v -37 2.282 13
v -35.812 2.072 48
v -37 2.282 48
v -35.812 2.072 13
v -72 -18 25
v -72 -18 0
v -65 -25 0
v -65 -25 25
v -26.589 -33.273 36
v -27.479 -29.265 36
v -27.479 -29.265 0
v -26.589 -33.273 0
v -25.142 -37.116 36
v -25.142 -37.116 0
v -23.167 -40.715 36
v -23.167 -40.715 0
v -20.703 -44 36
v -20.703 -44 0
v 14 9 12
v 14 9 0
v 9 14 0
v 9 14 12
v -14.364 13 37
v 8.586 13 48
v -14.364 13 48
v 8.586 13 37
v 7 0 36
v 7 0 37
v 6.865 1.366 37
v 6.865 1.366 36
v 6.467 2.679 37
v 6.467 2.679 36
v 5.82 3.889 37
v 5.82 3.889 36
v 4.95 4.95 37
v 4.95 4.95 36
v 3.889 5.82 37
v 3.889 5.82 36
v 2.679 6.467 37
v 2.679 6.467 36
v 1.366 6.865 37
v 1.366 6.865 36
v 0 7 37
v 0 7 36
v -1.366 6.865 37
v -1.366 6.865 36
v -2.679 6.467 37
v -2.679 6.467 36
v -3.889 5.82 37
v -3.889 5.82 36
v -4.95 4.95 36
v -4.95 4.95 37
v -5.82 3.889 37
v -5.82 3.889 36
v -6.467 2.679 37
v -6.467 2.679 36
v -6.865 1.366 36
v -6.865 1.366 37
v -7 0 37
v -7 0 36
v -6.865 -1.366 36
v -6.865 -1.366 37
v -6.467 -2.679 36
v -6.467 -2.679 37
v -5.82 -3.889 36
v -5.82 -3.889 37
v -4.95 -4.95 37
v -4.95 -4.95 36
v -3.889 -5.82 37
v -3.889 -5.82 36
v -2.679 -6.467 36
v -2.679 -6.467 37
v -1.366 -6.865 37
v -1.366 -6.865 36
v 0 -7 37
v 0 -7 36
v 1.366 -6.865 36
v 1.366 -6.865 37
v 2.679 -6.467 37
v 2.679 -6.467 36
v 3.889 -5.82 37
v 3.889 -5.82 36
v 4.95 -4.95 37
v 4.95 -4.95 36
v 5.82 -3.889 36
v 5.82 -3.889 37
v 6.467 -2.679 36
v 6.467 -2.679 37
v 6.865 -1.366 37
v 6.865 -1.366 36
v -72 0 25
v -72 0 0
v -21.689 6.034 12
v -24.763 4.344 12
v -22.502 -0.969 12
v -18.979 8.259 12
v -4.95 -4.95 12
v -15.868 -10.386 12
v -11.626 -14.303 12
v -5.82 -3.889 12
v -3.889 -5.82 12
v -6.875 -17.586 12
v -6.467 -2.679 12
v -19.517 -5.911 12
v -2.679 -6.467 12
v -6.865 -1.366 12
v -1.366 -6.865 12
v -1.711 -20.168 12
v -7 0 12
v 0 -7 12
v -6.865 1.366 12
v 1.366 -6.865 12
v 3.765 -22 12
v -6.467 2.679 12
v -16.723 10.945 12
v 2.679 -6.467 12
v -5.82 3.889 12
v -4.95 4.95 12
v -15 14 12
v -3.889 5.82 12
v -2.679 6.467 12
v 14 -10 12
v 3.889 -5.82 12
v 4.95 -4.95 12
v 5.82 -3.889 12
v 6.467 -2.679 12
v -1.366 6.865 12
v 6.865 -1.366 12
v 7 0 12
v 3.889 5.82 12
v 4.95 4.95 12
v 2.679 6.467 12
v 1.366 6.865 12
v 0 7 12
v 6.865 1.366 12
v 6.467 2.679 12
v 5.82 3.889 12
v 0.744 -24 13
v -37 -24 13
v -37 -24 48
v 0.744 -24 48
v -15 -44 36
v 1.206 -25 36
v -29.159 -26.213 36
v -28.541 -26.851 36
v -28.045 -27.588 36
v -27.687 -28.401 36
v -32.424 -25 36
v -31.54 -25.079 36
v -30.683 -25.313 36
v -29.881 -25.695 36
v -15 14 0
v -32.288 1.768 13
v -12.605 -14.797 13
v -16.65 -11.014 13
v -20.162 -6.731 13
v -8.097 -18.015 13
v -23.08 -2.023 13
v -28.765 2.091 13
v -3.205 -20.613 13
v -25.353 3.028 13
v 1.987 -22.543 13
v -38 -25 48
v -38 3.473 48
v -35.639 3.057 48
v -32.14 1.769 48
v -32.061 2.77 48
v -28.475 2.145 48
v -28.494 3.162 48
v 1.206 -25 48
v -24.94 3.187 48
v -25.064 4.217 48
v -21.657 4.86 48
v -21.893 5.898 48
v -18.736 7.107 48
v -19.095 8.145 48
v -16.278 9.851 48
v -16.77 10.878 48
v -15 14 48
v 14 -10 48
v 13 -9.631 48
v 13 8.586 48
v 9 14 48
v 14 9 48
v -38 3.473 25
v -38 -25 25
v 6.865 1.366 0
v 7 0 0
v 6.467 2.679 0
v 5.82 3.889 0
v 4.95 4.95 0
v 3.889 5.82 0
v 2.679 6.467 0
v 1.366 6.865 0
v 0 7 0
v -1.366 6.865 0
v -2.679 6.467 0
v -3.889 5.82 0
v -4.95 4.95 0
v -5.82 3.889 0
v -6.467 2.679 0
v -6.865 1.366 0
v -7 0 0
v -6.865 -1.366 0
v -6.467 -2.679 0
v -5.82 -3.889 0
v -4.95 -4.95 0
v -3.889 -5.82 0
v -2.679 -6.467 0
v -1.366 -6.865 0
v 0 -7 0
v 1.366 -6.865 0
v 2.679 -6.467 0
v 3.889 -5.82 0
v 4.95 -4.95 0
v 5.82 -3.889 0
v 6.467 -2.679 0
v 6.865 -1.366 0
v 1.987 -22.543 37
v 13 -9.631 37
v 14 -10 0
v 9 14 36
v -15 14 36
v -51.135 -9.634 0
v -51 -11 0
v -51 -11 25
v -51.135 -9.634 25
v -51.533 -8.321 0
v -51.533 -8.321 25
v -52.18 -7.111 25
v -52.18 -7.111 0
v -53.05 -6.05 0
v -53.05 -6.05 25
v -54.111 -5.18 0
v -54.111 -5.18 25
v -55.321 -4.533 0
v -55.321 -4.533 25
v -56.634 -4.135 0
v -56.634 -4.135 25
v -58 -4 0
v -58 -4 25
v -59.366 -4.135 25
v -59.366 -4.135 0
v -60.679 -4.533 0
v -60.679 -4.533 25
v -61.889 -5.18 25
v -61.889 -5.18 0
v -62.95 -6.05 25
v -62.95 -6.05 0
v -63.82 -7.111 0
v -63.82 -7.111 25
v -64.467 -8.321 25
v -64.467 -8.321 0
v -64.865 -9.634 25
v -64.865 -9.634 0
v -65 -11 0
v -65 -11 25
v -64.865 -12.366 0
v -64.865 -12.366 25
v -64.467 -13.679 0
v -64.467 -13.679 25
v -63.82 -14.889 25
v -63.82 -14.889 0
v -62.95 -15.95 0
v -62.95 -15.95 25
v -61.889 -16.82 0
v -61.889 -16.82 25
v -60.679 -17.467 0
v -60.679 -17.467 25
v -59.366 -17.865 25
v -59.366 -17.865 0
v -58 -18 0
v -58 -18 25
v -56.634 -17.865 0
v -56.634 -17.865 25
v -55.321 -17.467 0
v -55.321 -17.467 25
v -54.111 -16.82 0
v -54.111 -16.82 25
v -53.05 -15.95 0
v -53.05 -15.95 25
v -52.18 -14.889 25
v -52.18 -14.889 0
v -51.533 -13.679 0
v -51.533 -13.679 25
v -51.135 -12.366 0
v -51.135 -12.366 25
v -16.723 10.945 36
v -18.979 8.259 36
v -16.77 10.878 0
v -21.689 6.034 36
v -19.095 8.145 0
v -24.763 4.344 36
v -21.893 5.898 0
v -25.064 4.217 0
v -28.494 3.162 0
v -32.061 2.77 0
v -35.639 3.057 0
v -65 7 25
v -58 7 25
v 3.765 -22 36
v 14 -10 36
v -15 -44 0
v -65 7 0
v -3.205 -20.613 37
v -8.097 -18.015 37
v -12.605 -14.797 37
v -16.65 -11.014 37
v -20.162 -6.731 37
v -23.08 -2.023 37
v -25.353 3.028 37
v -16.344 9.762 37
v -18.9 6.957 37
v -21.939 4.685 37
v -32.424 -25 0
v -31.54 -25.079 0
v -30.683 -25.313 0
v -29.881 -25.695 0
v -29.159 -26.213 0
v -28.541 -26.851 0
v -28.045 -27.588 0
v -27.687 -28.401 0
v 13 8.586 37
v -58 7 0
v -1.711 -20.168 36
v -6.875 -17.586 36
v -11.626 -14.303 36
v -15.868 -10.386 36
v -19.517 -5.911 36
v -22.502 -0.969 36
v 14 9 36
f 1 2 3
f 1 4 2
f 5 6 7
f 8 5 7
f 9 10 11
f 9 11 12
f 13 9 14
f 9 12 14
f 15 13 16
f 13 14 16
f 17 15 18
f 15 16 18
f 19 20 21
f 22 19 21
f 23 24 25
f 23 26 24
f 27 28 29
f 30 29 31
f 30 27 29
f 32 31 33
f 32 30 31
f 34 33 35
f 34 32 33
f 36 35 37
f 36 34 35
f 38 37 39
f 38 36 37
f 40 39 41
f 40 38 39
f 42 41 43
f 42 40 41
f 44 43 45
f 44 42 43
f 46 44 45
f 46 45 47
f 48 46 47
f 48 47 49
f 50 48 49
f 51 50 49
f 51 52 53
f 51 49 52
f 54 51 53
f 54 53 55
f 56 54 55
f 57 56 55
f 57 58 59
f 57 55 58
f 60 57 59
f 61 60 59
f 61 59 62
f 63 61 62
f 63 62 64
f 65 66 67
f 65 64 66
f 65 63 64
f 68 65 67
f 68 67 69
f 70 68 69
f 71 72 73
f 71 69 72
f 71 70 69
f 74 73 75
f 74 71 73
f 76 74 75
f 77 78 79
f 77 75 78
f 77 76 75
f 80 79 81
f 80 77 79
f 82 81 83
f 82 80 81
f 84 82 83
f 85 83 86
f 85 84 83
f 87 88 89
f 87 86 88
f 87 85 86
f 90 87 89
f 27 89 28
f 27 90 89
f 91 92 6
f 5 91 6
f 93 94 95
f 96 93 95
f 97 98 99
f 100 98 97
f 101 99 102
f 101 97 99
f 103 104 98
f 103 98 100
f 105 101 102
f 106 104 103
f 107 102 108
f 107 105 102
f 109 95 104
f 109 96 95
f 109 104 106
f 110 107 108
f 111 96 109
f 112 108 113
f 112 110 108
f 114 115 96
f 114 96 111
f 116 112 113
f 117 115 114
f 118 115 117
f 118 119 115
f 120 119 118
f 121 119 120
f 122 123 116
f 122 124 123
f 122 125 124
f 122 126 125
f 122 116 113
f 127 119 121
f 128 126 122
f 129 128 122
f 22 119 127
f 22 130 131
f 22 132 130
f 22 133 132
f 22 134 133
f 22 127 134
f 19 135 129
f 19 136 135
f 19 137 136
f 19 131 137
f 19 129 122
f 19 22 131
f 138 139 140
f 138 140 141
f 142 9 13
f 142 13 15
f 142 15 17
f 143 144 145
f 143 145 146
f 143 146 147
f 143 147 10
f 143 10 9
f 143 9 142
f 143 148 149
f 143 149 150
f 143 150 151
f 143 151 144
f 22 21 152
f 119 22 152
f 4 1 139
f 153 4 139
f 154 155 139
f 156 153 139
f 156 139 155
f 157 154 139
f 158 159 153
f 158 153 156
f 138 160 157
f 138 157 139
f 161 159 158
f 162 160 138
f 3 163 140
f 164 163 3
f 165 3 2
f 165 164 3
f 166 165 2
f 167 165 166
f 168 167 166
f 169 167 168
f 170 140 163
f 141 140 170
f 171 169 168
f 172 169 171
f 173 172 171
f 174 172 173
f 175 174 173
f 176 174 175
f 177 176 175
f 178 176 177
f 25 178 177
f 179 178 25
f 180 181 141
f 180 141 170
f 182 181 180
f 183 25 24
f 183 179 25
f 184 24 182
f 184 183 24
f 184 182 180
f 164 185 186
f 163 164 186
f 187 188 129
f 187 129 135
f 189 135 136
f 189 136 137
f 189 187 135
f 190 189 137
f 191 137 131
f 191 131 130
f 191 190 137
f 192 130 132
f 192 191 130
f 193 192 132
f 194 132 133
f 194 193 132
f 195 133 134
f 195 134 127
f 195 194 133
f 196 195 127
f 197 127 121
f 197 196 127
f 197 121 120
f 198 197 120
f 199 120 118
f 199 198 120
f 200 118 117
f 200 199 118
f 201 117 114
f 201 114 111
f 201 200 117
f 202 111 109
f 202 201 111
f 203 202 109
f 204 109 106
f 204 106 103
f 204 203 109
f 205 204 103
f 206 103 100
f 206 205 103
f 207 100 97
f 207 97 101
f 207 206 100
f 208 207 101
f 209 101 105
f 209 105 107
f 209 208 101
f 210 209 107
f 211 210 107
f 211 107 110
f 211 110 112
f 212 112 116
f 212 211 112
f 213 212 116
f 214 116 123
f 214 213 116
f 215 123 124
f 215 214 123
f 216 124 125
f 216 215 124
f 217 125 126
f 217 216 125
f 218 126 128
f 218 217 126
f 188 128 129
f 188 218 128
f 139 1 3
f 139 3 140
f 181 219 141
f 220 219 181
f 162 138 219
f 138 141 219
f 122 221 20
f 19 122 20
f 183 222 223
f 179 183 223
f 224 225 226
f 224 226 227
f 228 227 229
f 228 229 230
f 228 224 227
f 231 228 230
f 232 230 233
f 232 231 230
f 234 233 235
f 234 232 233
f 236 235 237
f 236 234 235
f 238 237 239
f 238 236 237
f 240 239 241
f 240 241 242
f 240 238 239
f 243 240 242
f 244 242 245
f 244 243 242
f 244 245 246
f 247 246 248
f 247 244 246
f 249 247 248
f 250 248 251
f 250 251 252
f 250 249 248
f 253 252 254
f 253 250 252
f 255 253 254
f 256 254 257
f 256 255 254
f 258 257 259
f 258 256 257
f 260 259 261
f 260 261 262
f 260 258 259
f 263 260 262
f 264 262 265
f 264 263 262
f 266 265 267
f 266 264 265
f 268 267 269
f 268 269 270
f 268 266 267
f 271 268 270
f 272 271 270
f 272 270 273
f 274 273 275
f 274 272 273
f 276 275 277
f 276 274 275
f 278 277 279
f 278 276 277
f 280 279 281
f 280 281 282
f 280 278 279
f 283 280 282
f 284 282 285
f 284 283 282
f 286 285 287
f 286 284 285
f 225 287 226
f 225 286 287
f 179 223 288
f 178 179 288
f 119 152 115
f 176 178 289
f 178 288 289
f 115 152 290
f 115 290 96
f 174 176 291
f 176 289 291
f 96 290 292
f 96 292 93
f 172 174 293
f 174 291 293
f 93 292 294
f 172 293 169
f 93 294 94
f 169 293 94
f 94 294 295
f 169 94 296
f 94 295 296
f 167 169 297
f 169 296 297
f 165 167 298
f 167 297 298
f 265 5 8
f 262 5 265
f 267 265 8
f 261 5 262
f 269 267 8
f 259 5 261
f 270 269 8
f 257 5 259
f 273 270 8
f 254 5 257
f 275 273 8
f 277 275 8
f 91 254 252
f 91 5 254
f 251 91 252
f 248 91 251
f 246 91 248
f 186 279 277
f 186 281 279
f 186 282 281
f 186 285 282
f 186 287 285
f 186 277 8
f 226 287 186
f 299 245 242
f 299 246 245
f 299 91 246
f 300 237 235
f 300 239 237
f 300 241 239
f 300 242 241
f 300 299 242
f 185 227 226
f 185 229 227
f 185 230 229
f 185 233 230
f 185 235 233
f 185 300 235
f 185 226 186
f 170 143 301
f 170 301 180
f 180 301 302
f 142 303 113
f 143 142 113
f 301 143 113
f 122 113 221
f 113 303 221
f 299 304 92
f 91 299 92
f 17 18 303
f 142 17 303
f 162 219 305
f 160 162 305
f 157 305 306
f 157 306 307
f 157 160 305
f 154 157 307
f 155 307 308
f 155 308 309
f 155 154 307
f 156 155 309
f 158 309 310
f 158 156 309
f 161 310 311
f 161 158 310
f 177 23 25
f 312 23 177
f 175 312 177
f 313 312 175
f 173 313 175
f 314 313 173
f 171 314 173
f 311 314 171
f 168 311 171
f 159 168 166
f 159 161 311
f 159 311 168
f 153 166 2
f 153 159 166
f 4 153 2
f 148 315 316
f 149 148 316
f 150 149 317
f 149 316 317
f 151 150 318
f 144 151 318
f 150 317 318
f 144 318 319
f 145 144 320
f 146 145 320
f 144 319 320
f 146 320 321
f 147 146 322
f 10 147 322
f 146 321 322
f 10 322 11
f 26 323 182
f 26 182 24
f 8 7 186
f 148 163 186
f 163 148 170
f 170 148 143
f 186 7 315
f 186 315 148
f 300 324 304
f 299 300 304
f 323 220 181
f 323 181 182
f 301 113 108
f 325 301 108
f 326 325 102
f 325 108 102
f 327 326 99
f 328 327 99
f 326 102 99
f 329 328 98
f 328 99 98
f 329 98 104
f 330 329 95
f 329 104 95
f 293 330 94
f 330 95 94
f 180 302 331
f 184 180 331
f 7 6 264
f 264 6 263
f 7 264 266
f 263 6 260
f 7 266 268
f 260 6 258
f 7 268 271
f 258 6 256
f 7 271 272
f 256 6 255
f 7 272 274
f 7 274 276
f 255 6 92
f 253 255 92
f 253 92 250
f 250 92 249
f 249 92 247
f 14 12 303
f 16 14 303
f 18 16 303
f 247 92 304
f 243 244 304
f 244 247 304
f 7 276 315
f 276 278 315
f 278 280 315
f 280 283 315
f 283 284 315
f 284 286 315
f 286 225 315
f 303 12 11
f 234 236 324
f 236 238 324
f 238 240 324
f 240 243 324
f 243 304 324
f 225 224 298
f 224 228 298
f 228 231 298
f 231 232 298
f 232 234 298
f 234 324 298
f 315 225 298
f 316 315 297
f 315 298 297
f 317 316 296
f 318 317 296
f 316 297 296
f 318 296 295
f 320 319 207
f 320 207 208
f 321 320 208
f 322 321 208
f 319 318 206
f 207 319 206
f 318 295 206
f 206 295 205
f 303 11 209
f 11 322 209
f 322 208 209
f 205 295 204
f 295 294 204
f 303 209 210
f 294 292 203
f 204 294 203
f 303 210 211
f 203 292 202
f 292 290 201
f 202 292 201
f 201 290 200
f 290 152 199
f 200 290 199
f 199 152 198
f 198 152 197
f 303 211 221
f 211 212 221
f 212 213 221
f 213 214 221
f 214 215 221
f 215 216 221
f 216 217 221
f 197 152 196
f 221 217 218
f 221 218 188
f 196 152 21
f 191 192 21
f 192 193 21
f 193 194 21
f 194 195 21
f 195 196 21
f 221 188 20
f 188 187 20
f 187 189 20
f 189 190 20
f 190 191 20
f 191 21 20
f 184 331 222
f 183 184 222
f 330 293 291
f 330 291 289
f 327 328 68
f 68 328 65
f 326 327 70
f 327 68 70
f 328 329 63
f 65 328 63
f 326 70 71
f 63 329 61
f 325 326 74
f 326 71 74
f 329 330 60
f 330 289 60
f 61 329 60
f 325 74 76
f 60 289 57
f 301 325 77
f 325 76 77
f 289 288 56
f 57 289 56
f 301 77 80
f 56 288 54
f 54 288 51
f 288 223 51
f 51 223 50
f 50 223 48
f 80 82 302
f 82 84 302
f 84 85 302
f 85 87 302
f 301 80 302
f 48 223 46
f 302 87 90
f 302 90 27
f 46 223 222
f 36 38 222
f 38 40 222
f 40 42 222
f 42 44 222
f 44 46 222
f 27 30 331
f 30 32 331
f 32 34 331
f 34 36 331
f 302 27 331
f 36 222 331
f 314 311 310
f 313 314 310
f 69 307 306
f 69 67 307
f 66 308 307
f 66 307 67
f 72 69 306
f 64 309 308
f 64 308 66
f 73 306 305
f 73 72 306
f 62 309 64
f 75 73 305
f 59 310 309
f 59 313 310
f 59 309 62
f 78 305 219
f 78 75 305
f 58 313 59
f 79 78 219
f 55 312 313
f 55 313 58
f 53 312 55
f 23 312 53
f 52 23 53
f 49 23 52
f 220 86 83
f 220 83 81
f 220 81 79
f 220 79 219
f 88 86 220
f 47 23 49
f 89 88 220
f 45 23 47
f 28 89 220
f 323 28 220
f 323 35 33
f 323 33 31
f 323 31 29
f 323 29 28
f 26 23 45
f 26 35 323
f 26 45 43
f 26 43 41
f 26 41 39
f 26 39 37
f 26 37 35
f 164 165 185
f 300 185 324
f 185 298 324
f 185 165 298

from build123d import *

# Parameters (mm, degrees)
SKETCH1_R           = 7
BOSS_EXTRUDE1_DEPTH = 25
BOSS_EXTRUDE2_START = 12
BOSS_EXTRUDE2_DEPTH = 24
SKETCH1_4_R         = 7.000000000000007
BOSS_EXTRUDE3_DEPTH = 12
BOSS_EXTRUDE6_START = 36
SKETCH1_7_R         = 7.000000000000007
BOSS_EXTRUDE6_DEPTH = 12
SHELL7_T            = -1
BOSS_EXTRUDE7_DEPTH = 36
SKETCH2_R           = 9.695738558294309
CUT_EXTRUDE2_DEPTH  = 93.13576938409969


with BuildPart() as part:
    # Sketch1 → Boss-Extrude1 (new body)
    with BuildSketch(Plane.XY):
        Polygon((-72, -1.421e-14), (-72, -18.000000000000014), (-64.99999999999997, -25.000000000000014), (-38, -25.000000000000007), (-38.00000000000001, 3.4734603858306787), (-57.99999999999999, 6.999999999999986), (-65.00000000000001, 6.999999999999986), align=None)
        with Locations((-57.99999999999999, -11.000000000000014)):
            Circle(SKETCH1_R, mode=Mode.SUBTRACT)
    extrude(amount=BOSS_EXTRUDE1_DEPTH)

    # Sketch1<4> → Boss-Extrude3 (add)
    with BuildSketch(Plane.XY):
        with BuildLine():
            Line((-38.00000000000001, 3.4734603858306787), (-38, -25.000000000000014))
            Line((-38, -25.00000000000001), (1.2058823529411669, -25.00000000000001))
            Line((1.2058823529411677, -25.00000000000001), (14.000000000000004, -10))
            Line((14, -9.999999999999998), (13.999999999999998, 9.000000000000002))
            Line((13.999999999999998, 9.000000000000002), (8.999999999999979, 14))
            Line((8.999999999999979, 14), (-15.000000000000004, 14))
            ThreePointArc((-15.000000000000004, 14), (-23.43890129432416, 4.98204414221815), (-35.63861916422293, 3.057085232755277))
            Line((-35.63861916422293, 3.057085232755278), (-38.00000000000001, 3.4734603858306823))
        make_face()
        Circle(SKETCH1_4_R, mode=Mode.SUBTRACT)
    extrude(amount=BOSS_EXTRUDE3_DEPTH)

    # Sketch1<8> → Boss-Extrude7 (add)
    with BuildSketch(Plane.XY):
        with BuildLine():
            Line((1.2058823529411669, -25.00000000000001), (-32.424461088659314, -25.00000000000001))
            ThreePointArc((-32.424461088659314, -25.000000000000007), (-29.159225307604235, -26.213413767769495), (-27.478822347247476, -29.26470588235295))
            ThreePointArc((-27.47882234724748, -29.264705882352946), (-25.141992144084263, -37.11567206097118), (-20.70301994726548, -44.000000000000014))
            Line((-20.70301994726548, -44.000000000000014), (-14.999999999999996, -44.00000000000001))
            Line((-14.999999999999996, -44.00000000000001), (1.2058823529411704, -25.00000000000001))
        make_face()
    extrude(amount=BOSS_EXTRUDE7_DEPTH)


with BuildPart() as body_2:
    # Sketch1<3> → Boss-Extrude2 (new body)
    with BuildSketch(Plane.XY.offset(BOSS_EXTRUDE2_START)):
        with BuildLine():
            Line((-38.00000000000001, 3.4734603858306787), (-38, -25.000000000000014))
            Line((-38, -25.000000000000007), (-32.424461088659314, -25.000000000000007))
            Line((-32.424461088659314, -25.00000000000001), (1.2058823529411669, -25.00000000000001))
            Line((1.2058823529411704, -25.00000000000001), (3.764705882352942, -22))
            ThreePointArc((3.764705882352942, -22.000000000000004), (-13.815737017505185, -12.419294771345367), (-24.763063450975714, 4.344294617344023))
            ThreePointArc((-24.76306345097571, 4.344294617344016), (-30.106088890163186, 2.9001323723087005), (-35.63861916422293, 3.0570852327552736))
            Line((-35.63861916422293, 3.057085232755278), (-38.00000000000001, 3.4734603858306823))
        make_face()
    extrude(amount=BOSS_EXTRUDE2_DEPTH)

    # Sketch1<7> → Boss-Extrude6 (add)
    with BuildSketch(Plane.XY.offset(BOSS_EXTRUDE6_START)):
        with BuildLine():
            Line((-38.00000000000001, 3.4734603858306787), (-38, -25.000000000000014))
            Line((-38, -25.00000000000001), (1.2058823529411669, -25.00000000000001))
            Line((1.2058823529411677, -25.00000000000001), (14.000000000000004, -10))
            Line((14, -9.999999999999998), (13.999999999999998, 9.000000000000002))
            Line((13.999999999999998, 9.000000000000002), (8.999999999999979, 14))
            Line((8.999999999999979, 14), (-15.000000000000004, 14))
            ThreePointArc((-15.000000000000004, 14), (-23.43890129432416, 4.98204414221815), (-35.63861916422293, 3.057085232755277))
            Line((-35.63861916422293, 3.057085232755278), (-38.00000000000001, 3.4734603858306823))
        make_face()
        Circle(SKETCH1_7_R, mode=Mode.SUBTRACT)
    extrude(amount=BOSS_EXTRUDE6_DEPTH)

    # Shell7
    shell7_openings = [body_2.faces().sort_by_distance(p)[0] for p in [
        (-12.583479215, -7.183735209, 48),
    ]]
    offset(amount=SHELL7_T, openings=shell7_openings, kind=Kind.INTERSECTION)


with BuildPart() as part_1:
    add(part.part)

    # Combine1: union body 2
    add(body_2.part)

    # Sketch2 → Cut-Extrude2 (cut, through all)
    with BuildSketch(Plane.XY.offset(37)):
        Circle(SKETCH2_R)
    extrude(amount=CUT_EXTRUDE2_DEPTH, mode=Mode.SUBTRACT)


solid = part_1.part
